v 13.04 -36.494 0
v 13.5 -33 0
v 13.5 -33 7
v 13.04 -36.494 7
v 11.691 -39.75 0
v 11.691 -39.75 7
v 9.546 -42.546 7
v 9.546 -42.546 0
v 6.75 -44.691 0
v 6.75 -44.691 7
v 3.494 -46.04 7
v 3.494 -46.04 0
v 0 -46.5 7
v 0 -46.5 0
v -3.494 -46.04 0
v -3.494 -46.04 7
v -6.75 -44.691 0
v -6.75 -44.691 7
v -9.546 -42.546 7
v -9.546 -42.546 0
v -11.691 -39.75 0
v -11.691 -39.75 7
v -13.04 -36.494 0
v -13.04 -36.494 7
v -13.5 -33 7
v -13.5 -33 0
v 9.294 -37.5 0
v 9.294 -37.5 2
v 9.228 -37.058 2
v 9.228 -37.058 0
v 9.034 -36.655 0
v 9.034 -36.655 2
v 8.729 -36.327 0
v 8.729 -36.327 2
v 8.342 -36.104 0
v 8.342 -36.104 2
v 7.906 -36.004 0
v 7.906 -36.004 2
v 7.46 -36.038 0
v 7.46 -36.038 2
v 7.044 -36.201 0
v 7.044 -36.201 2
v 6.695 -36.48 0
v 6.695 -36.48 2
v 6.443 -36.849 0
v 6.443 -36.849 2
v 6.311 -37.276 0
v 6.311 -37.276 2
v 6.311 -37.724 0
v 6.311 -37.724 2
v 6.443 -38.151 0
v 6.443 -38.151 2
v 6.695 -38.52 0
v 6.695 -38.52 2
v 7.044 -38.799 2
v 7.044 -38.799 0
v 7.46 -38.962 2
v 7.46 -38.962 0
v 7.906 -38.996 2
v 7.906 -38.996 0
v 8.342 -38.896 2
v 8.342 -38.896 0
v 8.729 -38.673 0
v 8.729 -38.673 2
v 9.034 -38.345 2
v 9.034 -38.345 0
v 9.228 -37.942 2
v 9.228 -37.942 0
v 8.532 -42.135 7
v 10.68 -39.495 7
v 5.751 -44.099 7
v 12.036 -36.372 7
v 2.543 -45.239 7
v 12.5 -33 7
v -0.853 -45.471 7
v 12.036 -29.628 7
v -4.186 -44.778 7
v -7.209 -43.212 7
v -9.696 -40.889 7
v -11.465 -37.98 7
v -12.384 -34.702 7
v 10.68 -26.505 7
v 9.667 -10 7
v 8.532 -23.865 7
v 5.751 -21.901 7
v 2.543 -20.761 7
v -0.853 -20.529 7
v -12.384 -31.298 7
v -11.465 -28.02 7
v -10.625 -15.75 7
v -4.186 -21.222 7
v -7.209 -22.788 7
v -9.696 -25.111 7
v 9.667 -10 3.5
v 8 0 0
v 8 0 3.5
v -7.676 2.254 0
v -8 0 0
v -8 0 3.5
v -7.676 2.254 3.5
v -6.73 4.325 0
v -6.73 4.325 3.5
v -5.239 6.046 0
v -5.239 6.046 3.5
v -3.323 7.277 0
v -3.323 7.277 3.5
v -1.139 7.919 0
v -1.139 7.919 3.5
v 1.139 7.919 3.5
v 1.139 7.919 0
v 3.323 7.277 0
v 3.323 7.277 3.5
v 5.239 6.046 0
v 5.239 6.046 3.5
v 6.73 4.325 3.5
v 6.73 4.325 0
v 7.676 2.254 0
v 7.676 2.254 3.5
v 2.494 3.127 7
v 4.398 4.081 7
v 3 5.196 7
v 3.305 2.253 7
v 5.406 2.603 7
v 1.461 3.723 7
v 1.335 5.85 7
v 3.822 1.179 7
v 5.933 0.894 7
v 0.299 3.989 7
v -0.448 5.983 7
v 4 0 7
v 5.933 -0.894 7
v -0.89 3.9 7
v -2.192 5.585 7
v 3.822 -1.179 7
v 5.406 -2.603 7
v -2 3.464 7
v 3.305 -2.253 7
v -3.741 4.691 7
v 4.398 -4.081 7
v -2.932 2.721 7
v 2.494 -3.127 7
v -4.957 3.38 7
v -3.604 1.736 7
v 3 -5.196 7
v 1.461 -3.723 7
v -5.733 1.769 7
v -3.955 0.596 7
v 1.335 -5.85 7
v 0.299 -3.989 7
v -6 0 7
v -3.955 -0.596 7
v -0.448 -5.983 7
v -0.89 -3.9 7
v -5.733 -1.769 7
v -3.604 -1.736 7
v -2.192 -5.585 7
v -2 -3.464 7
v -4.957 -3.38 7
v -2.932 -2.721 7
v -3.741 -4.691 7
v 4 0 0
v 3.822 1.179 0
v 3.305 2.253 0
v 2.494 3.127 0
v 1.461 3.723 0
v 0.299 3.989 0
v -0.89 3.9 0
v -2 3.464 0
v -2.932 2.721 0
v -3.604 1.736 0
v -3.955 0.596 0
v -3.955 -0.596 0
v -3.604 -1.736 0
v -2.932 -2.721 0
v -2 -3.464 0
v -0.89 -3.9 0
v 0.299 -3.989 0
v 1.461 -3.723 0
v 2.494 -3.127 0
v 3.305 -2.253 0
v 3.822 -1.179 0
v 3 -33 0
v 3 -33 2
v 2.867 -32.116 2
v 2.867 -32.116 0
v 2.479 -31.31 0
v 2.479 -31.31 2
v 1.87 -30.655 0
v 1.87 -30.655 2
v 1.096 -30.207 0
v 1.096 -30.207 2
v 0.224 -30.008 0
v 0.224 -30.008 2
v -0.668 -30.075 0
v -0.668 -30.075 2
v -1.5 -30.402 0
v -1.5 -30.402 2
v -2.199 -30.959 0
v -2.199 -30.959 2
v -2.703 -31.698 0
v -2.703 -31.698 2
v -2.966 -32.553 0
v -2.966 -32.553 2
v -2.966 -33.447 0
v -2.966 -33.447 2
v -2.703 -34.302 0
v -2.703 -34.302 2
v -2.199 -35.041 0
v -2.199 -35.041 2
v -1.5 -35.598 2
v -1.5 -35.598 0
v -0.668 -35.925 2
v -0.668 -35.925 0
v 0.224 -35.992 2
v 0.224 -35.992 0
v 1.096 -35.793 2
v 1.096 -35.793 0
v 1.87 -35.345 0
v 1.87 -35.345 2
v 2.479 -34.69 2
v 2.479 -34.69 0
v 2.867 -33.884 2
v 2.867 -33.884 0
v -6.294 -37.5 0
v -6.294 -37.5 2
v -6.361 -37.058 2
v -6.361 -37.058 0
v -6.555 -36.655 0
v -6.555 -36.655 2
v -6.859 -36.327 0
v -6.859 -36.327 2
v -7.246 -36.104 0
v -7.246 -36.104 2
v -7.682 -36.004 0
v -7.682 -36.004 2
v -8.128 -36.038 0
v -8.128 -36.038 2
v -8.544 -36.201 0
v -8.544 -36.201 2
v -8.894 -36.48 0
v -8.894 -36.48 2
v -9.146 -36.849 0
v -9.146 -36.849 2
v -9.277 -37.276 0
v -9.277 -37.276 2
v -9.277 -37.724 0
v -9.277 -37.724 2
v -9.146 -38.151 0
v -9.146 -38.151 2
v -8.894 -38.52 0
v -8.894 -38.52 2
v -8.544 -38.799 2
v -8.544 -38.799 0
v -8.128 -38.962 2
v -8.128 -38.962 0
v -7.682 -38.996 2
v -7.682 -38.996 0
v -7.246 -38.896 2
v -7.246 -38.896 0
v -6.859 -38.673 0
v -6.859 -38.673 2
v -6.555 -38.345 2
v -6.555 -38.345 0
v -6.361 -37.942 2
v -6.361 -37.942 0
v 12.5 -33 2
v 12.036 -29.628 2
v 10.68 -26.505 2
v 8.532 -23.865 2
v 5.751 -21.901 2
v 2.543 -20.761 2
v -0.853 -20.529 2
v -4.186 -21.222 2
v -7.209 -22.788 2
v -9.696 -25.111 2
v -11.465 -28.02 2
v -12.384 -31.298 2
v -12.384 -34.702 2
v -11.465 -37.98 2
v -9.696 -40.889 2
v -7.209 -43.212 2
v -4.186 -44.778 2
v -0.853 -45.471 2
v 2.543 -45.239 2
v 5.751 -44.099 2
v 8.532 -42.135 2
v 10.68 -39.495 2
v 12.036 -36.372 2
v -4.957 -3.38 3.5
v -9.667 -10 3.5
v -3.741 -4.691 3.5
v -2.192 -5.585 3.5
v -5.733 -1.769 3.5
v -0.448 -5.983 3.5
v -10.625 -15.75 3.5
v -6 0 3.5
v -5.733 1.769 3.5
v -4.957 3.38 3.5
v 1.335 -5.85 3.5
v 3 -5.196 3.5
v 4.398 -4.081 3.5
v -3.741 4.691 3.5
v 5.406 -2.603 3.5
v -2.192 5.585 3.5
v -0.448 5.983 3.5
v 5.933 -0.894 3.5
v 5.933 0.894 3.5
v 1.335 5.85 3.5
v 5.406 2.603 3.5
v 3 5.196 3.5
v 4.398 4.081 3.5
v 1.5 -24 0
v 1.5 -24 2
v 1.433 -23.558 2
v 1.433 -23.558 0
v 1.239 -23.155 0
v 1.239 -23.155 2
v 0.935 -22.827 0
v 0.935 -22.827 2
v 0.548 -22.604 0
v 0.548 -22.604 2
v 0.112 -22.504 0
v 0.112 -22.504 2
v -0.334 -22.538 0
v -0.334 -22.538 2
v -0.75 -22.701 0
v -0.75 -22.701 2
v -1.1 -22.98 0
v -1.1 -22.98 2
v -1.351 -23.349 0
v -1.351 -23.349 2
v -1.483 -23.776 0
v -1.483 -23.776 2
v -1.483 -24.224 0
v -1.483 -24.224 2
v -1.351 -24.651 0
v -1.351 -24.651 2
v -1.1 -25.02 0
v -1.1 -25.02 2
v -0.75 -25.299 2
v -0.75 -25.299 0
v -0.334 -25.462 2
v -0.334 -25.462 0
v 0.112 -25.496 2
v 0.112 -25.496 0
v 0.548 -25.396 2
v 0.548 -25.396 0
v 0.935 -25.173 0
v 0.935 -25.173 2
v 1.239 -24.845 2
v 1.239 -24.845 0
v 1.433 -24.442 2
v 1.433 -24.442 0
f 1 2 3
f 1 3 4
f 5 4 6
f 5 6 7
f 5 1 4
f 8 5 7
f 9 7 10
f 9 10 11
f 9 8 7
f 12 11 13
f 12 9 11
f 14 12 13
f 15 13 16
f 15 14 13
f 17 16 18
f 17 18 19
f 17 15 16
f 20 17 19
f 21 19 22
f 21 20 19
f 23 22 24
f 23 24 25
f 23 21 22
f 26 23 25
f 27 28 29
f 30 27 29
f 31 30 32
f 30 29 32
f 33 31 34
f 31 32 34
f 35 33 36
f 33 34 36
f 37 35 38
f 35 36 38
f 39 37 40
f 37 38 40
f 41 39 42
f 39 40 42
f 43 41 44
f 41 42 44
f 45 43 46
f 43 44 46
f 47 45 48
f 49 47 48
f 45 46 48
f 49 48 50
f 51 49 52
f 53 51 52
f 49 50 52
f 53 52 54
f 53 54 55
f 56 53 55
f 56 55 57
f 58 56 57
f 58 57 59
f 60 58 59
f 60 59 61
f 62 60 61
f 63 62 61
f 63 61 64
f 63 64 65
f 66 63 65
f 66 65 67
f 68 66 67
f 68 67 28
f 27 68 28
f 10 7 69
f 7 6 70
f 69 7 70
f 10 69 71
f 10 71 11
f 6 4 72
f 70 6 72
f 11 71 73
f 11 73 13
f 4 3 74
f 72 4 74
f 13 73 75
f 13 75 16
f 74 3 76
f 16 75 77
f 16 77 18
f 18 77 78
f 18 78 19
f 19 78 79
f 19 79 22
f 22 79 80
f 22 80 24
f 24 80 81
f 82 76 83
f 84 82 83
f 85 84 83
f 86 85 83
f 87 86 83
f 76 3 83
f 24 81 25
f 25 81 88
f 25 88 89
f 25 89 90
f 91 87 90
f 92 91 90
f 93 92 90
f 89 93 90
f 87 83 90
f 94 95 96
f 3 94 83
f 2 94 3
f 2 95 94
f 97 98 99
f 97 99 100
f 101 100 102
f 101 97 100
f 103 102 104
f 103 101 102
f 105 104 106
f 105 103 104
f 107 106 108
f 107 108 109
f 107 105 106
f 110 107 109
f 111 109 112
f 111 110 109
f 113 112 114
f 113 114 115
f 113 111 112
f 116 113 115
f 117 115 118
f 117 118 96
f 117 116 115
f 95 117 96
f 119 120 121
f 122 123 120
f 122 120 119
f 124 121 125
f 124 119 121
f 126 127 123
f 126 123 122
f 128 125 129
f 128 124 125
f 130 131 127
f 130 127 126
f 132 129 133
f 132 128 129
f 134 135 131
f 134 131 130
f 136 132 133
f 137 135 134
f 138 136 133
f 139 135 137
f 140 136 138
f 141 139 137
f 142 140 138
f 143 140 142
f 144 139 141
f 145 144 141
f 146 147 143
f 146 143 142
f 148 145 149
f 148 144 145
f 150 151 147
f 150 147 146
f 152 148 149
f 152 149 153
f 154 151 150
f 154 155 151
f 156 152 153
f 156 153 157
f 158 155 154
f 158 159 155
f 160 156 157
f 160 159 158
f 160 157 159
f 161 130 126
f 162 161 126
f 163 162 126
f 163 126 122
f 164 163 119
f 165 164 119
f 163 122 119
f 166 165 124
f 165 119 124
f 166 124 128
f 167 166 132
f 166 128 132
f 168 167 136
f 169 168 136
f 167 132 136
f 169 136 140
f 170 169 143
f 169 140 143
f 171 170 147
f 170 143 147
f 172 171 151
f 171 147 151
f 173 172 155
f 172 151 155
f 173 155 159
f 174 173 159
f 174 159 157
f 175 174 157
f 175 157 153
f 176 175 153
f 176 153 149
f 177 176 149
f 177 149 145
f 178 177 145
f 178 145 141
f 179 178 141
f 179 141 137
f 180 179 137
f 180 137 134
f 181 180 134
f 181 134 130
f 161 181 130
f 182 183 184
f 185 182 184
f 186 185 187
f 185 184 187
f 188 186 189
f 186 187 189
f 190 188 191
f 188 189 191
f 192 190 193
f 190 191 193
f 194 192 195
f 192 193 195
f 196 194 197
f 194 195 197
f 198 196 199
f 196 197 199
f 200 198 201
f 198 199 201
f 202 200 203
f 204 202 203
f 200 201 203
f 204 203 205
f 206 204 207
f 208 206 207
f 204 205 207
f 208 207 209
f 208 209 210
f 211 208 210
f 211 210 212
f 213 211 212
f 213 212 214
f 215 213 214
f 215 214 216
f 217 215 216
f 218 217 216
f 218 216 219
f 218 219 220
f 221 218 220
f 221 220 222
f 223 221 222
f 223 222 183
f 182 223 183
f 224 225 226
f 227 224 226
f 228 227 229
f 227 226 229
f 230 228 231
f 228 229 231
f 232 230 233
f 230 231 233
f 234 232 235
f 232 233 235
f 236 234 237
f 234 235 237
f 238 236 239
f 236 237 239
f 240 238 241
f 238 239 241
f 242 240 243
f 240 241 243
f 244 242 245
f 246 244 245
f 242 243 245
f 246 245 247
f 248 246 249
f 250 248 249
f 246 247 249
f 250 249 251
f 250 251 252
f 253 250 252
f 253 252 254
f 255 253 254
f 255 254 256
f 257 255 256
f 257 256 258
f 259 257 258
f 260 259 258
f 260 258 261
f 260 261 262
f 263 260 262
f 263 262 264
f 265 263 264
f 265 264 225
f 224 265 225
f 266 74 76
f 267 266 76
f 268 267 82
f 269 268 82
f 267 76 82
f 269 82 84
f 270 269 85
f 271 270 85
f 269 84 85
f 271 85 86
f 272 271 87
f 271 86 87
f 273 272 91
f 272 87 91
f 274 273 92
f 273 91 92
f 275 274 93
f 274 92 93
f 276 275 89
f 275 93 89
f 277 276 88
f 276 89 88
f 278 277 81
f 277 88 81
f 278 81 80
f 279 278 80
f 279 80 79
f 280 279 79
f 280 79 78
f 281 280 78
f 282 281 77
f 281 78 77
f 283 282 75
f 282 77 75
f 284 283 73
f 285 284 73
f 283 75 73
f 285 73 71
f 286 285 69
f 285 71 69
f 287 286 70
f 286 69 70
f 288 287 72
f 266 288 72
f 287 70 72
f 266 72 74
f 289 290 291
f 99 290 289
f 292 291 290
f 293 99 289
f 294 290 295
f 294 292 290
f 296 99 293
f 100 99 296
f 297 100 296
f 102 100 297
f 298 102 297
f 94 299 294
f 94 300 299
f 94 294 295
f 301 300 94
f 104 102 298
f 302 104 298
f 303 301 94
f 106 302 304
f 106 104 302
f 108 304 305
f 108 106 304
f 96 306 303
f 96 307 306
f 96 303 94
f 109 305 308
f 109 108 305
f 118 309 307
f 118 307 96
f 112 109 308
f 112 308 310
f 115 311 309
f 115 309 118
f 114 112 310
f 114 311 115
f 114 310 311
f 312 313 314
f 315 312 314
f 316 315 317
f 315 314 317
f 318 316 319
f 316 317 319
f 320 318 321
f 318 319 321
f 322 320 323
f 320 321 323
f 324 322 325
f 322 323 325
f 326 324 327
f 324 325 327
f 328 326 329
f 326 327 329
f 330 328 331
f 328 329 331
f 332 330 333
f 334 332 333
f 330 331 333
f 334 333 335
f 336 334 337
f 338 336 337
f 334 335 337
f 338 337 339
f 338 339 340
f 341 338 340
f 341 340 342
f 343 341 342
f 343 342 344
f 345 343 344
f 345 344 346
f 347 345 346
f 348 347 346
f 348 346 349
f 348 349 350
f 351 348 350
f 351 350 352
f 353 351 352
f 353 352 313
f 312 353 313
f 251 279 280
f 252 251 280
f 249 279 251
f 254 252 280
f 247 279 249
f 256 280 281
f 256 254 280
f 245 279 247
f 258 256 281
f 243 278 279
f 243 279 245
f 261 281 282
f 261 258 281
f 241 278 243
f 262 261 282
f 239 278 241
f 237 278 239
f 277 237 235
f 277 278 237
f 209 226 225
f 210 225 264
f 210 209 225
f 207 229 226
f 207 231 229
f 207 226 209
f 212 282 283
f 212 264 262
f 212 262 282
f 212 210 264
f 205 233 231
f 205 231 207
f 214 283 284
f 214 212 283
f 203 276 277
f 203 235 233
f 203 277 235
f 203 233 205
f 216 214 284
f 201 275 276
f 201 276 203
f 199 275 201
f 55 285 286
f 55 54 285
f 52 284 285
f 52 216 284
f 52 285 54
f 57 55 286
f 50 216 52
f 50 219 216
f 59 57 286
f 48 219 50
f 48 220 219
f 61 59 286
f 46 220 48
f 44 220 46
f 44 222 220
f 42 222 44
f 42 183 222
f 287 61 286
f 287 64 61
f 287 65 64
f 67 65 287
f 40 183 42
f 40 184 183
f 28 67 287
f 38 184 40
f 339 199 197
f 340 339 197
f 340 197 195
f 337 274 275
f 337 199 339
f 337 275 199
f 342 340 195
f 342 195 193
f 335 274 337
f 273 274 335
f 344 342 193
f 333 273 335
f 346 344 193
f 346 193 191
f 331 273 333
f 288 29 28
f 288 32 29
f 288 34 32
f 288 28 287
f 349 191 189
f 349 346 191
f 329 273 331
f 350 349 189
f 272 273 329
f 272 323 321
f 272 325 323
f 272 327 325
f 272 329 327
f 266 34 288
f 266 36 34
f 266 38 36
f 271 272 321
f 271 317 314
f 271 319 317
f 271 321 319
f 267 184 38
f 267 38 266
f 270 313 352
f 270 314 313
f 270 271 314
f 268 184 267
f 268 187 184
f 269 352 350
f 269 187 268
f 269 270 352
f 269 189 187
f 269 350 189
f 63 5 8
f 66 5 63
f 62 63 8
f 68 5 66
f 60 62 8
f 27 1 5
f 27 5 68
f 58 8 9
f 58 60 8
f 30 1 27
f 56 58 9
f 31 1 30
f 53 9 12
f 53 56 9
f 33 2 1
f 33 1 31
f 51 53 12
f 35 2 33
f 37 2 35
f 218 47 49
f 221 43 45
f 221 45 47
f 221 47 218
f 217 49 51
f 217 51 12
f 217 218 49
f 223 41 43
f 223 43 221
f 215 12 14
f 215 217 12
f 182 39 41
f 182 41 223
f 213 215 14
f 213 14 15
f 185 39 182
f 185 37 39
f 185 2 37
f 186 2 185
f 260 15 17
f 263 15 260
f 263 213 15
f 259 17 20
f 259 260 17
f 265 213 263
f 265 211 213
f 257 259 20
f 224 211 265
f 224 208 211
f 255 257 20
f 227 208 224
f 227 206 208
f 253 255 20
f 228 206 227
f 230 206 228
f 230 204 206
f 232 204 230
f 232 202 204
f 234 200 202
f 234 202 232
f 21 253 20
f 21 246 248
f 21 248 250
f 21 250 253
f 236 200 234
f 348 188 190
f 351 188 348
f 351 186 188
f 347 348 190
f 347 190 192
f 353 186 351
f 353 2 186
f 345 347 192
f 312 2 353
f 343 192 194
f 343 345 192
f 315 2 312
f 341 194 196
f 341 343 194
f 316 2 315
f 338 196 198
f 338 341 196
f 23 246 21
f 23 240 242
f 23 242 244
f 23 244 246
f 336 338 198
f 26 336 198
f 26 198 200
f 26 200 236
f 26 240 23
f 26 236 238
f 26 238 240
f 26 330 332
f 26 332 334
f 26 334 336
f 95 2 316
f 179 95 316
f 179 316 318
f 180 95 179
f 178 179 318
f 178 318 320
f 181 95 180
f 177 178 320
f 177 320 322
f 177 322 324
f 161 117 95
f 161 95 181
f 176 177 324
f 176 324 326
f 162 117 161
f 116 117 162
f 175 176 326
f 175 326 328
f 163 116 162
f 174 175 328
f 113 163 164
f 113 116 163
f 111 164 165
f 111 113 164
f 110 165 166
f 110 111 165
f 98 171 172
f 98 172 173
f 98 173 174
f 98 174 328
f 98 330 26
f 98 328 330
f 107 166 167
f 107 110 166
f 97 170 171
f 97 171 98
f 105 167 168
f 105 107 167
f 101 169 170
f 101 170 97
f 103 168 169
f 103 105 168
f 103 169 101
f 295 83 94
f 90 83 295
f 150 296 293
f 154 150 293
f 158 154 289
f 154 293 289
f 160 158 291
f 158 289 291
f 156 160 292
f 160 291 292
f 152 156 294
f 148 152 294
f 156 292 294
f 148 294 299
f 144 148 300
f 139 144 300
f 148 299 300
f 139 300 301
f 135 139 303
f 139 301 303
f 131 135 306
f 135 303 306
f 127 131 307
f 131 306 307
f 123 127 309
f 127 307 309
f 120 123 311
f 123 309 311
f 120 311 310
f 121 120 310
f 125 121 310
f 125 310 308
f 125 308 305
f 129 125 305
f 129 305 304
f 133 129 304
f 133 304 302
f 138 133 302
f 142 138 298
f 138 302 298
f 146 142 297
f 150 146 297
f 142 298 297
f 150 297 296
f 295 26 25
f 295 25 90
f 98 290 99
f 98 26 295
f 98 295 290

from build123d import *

# Parameters (mm, degrees)
BOSS_EXTRU_1_DEPTH      = 7
ESQUISSE2_R             = 3
ENL_V_MAT_EXTRU_1_DEPTH = 7
ESQUISSE3_R             = 1.5
ENL_V_MAT_EXTRU_2_DEPTH = 7
ESQUISSE5_R             = 12.5
ENL_V_MAT_EXTRU_5_DEPTH = 5
ESQUISSE10_W            = 27
ESQUISSE10_H            = 3.5
ENL_V_MAT_EXTRU_6_DEPTH = 20
ESQUISSE12_R            = 6
BOSS_EXTRU_3_DEPTH      = 3.5
ESQUISSE13_R            = 4
ENL_V_MAT_EXTRU_7_DEPTH = 49.92340953
ENL_V_MAT_EXTRU_8_DEPTH = 3.5


with BuildPart() as part:
    # Esquisse1 → Boss.-Extru.1 (new body)
    with BuildSketch(Plane.XY):
        with BuildLine():
            Line((8, 0), (13.5, -33))
            ThreePointArc((13.5, -33), (0, -46.5), (-13.5, -33))
            Line((-13.5, -33), (-8, 0))
            ThreePointArc((-8, 0), (0, 8), (8, 0))
        make_face()
    extrude(amount=BOSS_EXTRU_1_DEPTH)

    # Esquisse2 → Enlèv. mat.-Extru.1 (cut)
    with BuildSketch(Plane.XY.offset(7)):
        with Locations((0, -33)):
            Circle(ESQUISSE2_R)
    extrude(amount=-ENL_V_MAT_EXTRU_1_DEPTH, mode=Mode.SUBTRACT)

    # Esquisse3 → Enlèv. mat.-Extru.2 (cut)
    with BuildSketch(Plane.XY.offset(7)):
        with Locations((0, -24)):
            Circle(ESQUISSE3_R)
        with Locations((-7.794228634, -37.5)):
            Circle(ESQUISSE3_R)
        with Locations((7.794228634, -37.5)):
            Circle(ESQUISSE3_R)
    extrude(amount=-ENL_V_MAT_EXTRU_2_DEPTH, mode=Mode.SUBTRACT)

    # Esquisse5 → Enlèv. mat.-Extru.5 (cut)
    with BuildSketch(Plane.XY.offset(7)):
        with Locations((0, -33)):
            Circle(ESQUISSE5_R)
    extrude(amount=-ENL_V_MAT_EXTRU_5_DEPTH, mode=Mode.SUBTRACT)

    # Esquisse10 → Enlèv. mat.-Extru.6 (cut)
    with BuildSketch(Plane(origin=(0, 10, 0), x_dir=(1, 0, 0), z_dir=(0, 1, 0))):
        with Locations((0, -5.25)):
            Rectangle(ESQUISSE10_W, ESQUISSE10_H)
    extrude(amount=-ENL_V_MAT_EXTRU_6_DEPTH, mode=Mode.SUBTRACT)

    # Esquisse12 → Boss.-Extru.3 (add)
    with BuildSketch(Plane.XY.offset(3.5)):
        with Locations(Location((0, 0, 0), (0, 0, 180))):
            Circle(ESQUISSE12_R)
    extrude(amount=BOSS_EXTRU_3_DEPTH)

    # Esquisse13 → Enlèv. mat.-Extru.7 (cut, through all)
    with BuildSketch(Plane.XY.offset(7)):
        Circle(ESQUISSE13_R)
    extrude(amount=-ENL_V_MAT_EXTRU_7_DEPTH, mode=Mode.SUBTRACT)

    # Esquisse14 → Enlèv. mat.-Extru.8 (cut)
    with BuildSketch(Plane.XY.offset(7)):
        Polygon((9.666666667, -10), (-10.625, -15.75), (-9.666666667, -10), align=None)
    extrude(amount=-ENL_V_MAT_EXTRU_8_DEPTH, mode=Mode.SUBTRACT)


solid = part.part
